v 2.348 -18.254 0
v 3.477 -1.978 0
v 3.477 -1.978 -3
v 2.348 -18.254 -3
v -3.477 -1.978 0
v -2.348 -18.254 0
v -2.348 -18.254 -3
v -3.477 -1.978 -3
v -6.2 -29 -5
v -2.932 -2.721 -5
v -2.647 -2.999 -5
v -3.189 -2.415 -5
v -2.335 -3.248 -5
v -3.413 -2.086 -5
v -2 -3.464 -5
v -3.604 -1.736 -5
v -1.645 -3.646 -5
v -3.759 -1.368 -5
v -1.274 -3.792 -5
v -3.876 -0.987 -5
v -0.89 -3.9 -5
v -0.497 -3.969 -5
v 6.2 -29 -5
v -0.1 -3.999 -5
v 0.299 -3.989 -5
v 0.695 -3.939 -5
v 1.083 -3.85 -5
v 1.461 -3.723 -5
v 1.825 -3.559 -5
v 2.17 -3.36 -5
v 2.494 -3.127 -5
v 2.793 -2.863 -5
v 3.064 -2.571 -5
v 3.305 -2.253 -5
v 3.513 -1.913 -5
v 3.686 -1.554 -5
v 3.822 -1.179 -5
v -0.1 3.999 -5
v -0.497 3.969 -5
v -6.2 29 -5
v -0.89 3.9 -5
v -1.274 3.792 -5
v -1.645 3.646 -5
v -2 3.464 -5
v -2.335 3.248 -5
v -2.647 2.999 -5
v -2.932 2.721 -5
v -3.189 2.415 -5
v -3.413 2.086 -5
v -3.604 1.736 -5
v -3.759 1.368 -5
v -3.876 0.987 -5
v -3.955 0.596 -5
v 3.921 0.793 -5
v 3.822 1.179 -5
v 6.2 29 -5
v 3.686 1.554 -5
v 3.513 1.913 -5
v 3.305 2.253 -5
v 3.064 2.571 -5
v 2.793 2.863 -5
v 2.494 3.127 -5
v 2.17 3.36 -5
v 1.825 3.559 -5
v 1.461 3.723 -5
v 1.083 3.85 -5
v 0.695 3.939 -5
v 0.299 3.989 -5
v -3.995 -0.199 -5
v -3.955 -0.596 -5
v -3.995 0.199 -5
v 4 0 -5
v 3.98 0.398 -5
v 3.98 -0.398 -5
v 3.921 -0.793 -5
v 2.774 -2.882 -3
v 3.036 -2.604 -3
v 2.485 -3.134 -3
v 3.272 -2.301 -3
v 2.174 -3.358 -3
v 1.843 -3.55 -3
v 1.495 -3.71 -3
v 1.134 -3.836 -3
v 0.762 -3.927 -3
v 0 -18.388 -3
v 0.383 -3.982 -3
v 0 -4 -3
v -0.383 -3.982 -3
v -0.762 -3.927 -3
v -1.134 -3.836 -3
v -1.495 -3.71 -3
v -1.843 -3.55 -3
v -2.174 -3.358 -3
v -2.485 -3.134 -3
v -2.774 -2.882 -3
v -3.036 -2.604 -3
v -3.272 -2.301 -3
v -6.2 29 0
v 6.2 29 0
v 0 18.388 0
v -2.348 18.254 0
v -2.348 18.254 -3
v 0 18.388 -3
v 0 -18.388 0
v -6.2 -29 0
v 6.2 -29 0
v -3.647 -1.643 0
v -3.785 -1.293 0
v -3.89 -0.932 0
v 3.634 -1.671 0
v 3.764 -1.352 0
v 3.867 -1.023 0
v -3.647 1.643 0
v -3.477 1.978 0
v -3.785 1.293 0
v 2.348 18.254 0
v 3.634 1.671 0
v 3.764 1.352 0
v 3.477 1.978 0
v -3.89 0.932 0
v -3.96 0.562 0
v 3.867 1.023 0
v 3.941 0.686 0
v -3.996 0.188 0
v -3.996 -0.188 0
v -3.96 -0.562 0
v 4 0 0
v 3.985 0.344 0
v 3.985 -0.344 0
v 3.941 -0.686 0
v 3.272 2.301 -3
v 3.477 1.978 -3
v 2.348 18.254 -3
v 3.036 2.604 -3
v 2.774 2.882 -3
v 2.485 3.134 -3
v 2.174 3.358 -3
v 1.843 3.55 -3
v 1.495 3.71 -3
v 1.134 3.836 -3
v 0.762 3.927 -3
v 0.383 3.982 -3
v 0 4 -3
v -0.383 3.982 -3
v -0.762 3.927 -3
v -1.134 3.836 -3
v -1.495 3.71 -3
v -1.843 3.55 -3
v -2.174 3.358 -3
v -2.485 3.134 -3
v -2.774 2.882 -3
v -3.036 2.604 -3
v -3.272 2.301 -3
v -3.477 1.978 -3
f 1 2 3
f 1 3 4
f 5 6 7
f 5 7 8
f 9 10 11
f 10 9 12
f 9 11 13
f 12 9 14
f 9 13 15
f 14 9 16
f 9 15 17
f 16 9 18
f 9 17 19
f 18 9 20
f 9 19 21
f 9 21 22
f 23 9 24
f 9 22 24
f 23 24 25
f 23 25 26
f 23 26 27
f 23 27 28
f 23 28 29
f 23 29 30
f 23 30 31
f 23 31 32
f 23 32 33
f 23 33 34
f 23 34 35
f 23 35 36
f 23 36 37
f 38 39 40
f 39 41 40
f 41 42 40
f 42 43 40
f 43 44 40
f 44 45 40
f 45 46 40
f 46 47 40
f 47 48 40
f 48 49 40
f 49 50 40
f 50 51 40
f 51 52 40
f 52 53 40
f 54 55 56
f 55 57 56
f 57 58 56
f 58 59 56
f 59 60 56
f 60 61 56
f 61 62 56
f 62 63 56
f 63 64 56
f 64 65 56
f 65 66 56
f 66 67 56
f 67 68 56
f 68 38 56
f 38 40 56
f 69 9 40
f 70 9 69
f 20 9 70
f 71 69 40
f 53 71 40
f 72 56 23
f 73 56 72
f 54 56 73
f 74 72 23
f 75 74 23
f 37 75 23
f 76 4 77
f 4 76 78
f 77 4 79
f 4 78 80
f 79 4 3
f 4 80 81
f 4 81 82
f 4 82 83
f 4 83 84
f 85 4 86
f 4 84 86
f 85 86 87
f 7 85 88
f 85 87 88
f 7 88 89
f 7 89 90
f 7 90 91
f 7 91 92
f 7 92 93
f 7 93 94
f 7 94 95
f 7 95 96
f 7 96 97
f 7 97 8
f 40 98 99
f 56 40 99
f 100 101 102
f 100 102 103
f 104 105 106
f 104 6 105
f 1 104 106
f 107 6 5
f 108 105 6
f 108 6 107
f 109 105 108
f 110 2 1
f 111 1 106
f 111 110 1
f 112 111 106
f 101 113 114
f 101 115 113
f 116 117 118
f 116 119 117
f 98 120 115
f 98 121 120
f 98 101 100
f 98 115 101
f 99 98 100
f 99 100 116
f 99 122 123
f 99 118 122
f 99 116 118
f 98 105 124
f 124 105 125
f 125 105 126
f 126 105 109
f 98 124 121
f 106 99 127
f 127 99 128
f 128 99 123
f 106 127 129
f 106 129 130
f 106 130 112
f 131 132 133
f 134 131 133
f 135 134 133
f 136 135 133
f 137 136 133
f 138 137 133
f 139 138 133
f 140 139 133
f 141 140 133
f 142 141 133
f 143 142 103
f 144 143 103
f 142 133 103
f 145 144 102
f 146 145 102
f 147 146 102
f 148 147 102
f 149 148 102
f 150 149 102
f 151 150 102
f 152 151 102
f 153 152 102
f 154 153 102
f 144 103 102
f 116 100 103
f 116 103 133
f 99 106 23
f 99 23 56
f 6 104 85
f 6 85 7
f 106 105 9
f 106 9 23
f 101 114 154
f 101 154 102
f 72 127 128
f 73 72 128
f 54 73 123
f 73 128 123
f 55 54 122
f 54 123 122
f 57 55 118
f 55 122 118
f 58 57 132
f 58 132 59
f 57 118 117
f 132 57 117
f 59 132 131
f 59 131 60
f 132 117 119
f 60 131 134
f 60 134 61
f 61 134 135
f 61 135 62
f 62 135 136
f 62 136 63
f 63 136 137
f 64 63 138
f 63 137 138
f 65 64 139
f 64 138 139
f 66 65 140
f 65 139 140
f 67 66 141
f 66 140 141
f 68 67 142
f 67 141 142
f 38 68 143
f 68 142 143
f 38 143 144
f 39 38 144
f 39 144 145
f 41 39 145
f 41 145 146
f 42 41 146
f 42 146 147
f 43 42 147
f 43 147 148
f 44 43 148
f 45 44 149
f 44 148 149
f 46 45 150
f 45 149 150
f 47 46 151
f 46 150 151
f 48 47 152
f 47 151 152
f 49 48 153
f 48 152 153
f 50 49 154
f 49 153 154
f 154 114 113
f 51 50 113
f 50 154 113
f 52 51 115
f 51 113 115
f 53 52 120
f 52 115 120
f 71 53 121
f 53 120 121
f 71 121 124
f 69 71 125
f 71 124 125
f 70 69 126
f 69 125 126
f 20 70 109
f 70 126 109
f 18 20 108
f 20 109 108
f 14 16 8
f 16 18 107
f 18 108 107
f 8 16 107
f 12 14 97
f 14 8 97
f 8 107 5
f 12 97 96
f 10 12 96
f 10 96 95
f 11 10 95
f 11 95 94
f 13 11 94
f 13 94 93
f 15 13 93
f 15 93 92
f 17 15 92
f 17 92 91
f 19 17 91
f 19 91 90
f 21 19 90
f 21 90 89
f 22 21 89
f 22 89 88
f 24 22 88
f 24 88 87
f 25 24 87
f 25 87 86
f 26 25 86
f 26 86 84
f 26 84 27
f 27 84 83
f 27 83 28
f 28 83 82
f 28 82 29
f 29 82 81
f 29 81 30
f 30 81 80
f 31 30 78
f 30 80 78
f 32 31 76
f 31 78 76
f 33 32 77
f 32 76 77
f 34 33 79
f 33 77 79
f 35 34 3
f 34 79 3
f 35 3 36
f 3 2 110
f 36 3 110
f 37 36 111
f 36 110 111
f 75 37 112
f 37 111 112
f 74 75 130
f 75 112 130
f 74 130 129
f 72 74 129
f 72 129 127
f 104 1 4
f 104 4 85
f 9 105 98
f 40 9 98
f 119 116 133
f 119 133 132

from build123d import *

# Parameters (mm, degrees)
SKETCH1_W           = 12.4
SKETCH1_H           = 58
BOSS_EXTRUDE1_DEPTH = 5
CUT_EXTRUDE1_DEPTH  = 3
SKETCH4_R           = 4
CUT_EXTRUDE2_DEPTH  = 5


with BuildPart() as part:
    # Sketch1 → Boss-Extrude1 (new body)
    with BuildSketch(Plane.XY):
        Rectangle(SKETCH1_W, SKETCH1_H)
    extrude(amount=-BOSS_EXTRUDE1_DEPTH)

    # Sketch2 → Cut-Extrude1 (cut)
    with BuildSketch(Plane.XY):
        Polygon((-3.613807992, 0), (-2.3482015, 18.253803872), (0, 18.387804485), (2.3482015, 18.253803872), (3.613807992, 0), (2.3482015, -18.253803872), (0, -18.387804485), (-2.3482015, -18.253803872), align=None)
    extrude(amount=-CUT_EXTRUDE1_DEPTH, mode=Mode.SUBTRACT)

    # Sketch4 → Cut-Extrude2 (cut)
    with BuildSketch(Plane.XY):
        Circle(SKETCH4_R)
    extrude(amount=-CUT_EXTRUDE2_DEPTH, mode=Mode.SUBTRACT)


solid = part.part
